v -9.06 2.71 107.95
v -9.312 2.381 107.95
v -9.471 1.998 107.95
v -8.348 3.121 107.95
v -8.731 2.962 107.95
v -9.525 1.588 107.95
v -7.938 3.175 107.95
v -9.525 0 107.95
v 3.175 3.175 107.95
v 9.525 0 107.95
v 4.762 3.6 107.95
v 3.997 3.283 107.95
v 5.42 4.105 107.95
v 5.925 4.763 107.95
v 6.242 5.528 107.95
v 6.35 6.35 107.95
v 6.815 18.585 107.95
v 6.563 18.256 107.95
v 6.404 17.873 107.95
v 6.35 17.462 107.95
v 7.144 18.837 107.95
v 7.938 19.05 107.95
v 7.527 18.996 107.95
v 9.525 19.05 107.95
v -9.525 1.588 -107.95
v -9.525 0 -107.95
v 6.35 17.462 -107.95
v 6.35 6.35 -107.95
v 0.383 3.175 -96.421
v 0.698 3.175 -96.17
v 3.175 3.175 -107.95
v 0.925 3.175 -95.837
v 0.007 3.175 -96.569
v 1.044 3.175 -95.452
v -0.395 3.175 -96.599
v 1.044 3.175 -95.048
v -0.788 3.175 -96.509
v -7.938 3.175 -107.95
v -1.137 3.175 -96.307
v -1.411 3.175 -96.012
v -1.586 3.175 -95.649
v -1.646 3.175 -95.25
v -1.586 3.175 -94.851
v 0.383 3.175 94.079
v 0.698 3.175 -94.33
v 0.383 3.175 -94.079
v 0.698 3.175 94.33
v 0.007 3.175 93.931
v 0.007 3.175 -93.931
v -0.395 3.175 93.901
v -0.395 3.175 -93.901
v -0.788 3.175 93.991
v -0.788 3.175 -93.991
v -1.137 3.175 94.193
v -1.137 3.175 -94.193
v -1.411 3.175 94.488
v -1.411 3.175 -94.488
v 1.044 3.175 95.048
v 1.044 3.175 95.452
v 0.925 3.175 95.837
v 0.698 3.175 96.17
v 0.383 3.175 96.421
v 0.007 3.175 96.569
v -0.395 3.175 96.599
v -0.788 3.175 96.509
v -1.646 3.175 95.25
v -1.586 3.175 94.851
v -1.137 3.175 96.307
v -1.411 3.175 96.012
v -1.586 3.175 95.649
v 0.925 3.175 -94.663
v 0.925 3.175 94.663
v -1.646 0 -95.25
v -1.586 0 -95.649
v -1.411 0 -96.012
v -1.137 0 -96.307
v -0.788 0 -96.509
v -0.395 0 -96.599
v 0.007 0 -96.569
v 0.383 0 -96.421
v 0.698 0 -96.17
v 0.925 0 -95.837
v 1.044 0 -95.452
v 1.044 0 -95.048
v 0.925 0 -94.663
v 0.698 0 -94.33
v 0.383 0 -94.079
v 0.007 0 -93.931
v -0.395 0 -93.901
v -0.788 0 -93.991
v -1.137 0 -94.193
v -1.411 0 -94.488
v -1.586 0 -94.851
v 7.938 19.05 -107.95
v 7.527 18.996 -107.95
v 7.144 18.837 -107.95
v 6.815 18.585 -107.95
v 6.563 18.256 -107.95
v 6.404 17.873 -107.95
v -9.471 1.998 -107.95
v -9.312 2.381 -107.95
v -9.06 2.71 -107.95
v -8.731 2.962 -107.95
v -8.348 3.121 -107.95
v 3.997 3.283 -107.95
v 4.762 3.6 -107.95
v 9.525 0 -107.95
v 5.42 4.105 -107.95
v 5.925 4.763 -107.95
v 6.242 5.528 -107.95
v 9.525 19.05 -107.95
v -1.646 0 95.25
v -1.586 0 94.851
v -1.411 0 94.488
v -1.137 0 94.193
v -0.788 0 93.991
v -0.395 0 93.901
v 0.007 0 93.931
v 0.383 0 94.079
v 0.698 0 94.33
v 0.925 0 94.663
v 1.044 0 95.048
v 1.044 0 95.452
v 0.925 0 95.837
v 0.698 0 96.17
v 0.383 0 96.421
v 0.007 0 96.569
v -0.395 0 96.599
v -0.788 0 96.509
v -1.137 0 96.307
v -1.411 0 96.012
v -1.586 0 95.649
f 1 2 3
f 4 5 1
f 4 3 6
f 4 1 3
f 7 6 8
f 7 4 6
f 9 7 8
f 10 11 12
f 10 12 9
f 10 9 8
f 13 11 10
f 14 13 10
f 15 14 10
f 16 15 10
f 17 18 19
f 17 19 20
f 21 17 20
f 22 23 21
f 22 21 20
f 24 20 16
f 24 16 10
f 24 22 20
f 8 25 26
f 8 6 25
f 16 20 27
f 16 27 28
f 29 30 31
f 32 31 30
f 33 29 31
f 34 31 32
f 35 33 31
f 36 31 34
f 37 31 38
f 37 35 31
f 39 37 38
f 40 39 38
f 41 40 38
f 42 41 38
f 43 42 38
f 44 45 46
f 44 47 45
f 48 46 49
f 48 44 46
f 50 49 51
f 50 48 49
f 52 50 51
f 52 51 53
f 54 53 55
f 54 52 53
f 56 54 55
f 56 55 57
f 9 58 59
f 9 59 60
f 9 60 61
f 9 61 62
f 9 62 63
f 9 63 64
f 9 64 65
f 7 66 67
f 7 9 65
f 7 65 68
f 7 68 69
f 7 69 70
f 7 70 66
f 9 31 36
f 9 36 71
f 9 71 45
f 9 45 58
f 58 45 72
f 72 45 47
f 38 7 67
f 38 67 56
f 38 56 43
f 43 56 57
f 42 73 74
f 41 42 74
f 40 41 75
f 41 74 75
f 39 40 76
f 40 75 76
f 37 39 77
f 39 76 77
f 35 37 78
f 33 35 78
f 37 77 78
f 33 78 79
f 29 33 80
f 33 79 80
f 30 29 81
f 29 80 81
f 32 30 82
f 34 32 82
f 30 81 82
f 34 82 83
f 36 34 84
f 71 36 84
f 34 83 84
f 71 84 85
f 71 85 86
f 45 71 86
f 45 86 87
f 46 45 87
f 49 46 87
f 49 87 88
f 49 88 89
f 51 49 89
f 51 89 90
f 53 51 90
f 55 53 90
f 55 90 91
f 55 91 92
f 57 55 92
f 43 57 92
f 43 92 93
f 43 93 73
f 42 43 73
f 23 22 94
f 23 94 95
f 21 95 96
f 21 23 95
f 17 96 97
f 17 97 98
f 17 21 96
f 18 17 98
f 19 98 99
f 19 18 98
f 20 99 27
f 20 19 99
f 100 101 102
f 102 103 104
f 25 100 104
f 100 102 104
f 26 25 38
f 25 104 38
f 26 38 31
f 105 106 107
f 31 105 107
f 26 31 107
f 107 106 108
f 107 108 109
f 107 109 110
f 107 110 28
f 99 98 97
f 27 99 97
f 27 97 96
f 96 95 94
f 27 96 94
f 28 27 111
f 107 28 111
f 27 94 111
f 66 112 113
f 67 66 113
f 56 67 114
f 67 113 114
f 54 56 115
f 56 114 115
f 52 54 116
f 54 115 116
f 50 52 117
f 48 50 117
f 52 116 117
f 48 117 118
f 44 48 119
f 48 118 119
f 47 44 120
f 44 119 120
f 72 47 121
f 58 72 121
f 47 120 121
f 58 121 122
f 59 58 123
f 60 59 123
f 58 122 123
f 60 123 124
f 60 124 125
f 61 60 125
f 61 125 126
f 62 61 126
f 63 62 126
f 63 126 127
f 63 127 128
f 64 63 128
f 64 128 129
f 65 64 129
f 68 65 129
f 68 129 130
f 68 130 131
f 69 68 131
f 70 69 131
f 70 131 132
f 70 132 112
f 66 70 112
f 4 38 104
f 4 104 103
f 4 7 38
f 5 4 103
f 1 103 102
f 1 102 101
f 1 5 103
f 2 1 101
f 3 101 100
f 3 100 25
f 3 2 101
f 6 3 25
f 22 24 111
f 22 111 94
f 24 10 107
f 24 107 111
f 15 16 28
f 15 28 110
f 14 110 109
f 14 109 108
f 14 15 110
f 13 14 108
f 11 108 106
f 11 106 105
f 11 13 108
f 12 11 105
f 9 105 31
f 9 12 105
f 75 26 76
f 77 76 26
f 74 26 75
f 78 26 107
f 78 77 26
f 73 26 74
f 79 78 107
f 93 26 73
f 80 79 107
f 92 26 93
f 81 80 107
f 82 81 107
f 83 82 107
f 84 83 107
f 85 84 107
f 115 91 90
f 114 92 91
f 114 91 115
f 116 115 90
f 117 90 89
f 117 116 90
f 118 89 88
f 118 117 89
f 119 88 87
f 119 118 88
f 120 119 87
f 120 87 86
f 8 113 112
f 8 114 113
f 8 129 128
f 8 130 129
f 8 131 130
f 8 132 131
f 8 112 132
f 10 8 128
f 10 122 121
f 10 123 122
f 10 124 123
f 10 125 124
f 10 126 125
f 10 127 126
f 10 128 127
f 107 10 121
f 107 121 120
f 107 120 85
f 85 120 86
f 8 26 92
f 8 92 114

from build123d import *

# Parameters (mm, degrees)
BOSS_EXTRUDE1_DEPTH   = 107.95
F_6_32_TAPPED_HOLE1_D = 2.7051


with BuildPart() as part:
    # Sketch2 → Boss-Extrude1 (new, symmetric)
    with BuildSketch(Plane.XY):
        with BuildLine():
            Line((-9.525, 0), (9.525, 0))
            Line((9.525, 0), (9.525, 19.05))
            Line((9.525, 19.05), (7.9375, 19.05))
            ThreePointArc((7.9375, 19.05), (6.814967985, 18.585032015), (6.35, 17.4625))
            Line((6.35, 17.4625), (6.35, 6.35))
            ThreePointArc((6.35, 6.35), (5.42006403, 4.10493597), (3.175, 3.175))
            Line((3.175, 3.175), (-7.9375, 3.175))
            ThreePointArc((-7.9375, 3.175), (-9.060032015, 2.710032015), (-9.525, 1.5875))
            Line((-9.525, 1.5875), (-9.525, 0))
        make_face()
    extrude(amount=BOSS_EXTRUDE1_DEPTH, both=True)

    # #6-32 Tapped Hole1 (through all)
    with Locations(Plane(origin=(0, 3.175, 0), x_dir=(1, 0, 0), z_dir=(0, 1, 0))):
        with Locations((-0.2937383, -95.25), (-0.2937383, 95.25)):
            Hole(F_6_32_TAPPED_HOLE1_D / 2)


solid = part.part
